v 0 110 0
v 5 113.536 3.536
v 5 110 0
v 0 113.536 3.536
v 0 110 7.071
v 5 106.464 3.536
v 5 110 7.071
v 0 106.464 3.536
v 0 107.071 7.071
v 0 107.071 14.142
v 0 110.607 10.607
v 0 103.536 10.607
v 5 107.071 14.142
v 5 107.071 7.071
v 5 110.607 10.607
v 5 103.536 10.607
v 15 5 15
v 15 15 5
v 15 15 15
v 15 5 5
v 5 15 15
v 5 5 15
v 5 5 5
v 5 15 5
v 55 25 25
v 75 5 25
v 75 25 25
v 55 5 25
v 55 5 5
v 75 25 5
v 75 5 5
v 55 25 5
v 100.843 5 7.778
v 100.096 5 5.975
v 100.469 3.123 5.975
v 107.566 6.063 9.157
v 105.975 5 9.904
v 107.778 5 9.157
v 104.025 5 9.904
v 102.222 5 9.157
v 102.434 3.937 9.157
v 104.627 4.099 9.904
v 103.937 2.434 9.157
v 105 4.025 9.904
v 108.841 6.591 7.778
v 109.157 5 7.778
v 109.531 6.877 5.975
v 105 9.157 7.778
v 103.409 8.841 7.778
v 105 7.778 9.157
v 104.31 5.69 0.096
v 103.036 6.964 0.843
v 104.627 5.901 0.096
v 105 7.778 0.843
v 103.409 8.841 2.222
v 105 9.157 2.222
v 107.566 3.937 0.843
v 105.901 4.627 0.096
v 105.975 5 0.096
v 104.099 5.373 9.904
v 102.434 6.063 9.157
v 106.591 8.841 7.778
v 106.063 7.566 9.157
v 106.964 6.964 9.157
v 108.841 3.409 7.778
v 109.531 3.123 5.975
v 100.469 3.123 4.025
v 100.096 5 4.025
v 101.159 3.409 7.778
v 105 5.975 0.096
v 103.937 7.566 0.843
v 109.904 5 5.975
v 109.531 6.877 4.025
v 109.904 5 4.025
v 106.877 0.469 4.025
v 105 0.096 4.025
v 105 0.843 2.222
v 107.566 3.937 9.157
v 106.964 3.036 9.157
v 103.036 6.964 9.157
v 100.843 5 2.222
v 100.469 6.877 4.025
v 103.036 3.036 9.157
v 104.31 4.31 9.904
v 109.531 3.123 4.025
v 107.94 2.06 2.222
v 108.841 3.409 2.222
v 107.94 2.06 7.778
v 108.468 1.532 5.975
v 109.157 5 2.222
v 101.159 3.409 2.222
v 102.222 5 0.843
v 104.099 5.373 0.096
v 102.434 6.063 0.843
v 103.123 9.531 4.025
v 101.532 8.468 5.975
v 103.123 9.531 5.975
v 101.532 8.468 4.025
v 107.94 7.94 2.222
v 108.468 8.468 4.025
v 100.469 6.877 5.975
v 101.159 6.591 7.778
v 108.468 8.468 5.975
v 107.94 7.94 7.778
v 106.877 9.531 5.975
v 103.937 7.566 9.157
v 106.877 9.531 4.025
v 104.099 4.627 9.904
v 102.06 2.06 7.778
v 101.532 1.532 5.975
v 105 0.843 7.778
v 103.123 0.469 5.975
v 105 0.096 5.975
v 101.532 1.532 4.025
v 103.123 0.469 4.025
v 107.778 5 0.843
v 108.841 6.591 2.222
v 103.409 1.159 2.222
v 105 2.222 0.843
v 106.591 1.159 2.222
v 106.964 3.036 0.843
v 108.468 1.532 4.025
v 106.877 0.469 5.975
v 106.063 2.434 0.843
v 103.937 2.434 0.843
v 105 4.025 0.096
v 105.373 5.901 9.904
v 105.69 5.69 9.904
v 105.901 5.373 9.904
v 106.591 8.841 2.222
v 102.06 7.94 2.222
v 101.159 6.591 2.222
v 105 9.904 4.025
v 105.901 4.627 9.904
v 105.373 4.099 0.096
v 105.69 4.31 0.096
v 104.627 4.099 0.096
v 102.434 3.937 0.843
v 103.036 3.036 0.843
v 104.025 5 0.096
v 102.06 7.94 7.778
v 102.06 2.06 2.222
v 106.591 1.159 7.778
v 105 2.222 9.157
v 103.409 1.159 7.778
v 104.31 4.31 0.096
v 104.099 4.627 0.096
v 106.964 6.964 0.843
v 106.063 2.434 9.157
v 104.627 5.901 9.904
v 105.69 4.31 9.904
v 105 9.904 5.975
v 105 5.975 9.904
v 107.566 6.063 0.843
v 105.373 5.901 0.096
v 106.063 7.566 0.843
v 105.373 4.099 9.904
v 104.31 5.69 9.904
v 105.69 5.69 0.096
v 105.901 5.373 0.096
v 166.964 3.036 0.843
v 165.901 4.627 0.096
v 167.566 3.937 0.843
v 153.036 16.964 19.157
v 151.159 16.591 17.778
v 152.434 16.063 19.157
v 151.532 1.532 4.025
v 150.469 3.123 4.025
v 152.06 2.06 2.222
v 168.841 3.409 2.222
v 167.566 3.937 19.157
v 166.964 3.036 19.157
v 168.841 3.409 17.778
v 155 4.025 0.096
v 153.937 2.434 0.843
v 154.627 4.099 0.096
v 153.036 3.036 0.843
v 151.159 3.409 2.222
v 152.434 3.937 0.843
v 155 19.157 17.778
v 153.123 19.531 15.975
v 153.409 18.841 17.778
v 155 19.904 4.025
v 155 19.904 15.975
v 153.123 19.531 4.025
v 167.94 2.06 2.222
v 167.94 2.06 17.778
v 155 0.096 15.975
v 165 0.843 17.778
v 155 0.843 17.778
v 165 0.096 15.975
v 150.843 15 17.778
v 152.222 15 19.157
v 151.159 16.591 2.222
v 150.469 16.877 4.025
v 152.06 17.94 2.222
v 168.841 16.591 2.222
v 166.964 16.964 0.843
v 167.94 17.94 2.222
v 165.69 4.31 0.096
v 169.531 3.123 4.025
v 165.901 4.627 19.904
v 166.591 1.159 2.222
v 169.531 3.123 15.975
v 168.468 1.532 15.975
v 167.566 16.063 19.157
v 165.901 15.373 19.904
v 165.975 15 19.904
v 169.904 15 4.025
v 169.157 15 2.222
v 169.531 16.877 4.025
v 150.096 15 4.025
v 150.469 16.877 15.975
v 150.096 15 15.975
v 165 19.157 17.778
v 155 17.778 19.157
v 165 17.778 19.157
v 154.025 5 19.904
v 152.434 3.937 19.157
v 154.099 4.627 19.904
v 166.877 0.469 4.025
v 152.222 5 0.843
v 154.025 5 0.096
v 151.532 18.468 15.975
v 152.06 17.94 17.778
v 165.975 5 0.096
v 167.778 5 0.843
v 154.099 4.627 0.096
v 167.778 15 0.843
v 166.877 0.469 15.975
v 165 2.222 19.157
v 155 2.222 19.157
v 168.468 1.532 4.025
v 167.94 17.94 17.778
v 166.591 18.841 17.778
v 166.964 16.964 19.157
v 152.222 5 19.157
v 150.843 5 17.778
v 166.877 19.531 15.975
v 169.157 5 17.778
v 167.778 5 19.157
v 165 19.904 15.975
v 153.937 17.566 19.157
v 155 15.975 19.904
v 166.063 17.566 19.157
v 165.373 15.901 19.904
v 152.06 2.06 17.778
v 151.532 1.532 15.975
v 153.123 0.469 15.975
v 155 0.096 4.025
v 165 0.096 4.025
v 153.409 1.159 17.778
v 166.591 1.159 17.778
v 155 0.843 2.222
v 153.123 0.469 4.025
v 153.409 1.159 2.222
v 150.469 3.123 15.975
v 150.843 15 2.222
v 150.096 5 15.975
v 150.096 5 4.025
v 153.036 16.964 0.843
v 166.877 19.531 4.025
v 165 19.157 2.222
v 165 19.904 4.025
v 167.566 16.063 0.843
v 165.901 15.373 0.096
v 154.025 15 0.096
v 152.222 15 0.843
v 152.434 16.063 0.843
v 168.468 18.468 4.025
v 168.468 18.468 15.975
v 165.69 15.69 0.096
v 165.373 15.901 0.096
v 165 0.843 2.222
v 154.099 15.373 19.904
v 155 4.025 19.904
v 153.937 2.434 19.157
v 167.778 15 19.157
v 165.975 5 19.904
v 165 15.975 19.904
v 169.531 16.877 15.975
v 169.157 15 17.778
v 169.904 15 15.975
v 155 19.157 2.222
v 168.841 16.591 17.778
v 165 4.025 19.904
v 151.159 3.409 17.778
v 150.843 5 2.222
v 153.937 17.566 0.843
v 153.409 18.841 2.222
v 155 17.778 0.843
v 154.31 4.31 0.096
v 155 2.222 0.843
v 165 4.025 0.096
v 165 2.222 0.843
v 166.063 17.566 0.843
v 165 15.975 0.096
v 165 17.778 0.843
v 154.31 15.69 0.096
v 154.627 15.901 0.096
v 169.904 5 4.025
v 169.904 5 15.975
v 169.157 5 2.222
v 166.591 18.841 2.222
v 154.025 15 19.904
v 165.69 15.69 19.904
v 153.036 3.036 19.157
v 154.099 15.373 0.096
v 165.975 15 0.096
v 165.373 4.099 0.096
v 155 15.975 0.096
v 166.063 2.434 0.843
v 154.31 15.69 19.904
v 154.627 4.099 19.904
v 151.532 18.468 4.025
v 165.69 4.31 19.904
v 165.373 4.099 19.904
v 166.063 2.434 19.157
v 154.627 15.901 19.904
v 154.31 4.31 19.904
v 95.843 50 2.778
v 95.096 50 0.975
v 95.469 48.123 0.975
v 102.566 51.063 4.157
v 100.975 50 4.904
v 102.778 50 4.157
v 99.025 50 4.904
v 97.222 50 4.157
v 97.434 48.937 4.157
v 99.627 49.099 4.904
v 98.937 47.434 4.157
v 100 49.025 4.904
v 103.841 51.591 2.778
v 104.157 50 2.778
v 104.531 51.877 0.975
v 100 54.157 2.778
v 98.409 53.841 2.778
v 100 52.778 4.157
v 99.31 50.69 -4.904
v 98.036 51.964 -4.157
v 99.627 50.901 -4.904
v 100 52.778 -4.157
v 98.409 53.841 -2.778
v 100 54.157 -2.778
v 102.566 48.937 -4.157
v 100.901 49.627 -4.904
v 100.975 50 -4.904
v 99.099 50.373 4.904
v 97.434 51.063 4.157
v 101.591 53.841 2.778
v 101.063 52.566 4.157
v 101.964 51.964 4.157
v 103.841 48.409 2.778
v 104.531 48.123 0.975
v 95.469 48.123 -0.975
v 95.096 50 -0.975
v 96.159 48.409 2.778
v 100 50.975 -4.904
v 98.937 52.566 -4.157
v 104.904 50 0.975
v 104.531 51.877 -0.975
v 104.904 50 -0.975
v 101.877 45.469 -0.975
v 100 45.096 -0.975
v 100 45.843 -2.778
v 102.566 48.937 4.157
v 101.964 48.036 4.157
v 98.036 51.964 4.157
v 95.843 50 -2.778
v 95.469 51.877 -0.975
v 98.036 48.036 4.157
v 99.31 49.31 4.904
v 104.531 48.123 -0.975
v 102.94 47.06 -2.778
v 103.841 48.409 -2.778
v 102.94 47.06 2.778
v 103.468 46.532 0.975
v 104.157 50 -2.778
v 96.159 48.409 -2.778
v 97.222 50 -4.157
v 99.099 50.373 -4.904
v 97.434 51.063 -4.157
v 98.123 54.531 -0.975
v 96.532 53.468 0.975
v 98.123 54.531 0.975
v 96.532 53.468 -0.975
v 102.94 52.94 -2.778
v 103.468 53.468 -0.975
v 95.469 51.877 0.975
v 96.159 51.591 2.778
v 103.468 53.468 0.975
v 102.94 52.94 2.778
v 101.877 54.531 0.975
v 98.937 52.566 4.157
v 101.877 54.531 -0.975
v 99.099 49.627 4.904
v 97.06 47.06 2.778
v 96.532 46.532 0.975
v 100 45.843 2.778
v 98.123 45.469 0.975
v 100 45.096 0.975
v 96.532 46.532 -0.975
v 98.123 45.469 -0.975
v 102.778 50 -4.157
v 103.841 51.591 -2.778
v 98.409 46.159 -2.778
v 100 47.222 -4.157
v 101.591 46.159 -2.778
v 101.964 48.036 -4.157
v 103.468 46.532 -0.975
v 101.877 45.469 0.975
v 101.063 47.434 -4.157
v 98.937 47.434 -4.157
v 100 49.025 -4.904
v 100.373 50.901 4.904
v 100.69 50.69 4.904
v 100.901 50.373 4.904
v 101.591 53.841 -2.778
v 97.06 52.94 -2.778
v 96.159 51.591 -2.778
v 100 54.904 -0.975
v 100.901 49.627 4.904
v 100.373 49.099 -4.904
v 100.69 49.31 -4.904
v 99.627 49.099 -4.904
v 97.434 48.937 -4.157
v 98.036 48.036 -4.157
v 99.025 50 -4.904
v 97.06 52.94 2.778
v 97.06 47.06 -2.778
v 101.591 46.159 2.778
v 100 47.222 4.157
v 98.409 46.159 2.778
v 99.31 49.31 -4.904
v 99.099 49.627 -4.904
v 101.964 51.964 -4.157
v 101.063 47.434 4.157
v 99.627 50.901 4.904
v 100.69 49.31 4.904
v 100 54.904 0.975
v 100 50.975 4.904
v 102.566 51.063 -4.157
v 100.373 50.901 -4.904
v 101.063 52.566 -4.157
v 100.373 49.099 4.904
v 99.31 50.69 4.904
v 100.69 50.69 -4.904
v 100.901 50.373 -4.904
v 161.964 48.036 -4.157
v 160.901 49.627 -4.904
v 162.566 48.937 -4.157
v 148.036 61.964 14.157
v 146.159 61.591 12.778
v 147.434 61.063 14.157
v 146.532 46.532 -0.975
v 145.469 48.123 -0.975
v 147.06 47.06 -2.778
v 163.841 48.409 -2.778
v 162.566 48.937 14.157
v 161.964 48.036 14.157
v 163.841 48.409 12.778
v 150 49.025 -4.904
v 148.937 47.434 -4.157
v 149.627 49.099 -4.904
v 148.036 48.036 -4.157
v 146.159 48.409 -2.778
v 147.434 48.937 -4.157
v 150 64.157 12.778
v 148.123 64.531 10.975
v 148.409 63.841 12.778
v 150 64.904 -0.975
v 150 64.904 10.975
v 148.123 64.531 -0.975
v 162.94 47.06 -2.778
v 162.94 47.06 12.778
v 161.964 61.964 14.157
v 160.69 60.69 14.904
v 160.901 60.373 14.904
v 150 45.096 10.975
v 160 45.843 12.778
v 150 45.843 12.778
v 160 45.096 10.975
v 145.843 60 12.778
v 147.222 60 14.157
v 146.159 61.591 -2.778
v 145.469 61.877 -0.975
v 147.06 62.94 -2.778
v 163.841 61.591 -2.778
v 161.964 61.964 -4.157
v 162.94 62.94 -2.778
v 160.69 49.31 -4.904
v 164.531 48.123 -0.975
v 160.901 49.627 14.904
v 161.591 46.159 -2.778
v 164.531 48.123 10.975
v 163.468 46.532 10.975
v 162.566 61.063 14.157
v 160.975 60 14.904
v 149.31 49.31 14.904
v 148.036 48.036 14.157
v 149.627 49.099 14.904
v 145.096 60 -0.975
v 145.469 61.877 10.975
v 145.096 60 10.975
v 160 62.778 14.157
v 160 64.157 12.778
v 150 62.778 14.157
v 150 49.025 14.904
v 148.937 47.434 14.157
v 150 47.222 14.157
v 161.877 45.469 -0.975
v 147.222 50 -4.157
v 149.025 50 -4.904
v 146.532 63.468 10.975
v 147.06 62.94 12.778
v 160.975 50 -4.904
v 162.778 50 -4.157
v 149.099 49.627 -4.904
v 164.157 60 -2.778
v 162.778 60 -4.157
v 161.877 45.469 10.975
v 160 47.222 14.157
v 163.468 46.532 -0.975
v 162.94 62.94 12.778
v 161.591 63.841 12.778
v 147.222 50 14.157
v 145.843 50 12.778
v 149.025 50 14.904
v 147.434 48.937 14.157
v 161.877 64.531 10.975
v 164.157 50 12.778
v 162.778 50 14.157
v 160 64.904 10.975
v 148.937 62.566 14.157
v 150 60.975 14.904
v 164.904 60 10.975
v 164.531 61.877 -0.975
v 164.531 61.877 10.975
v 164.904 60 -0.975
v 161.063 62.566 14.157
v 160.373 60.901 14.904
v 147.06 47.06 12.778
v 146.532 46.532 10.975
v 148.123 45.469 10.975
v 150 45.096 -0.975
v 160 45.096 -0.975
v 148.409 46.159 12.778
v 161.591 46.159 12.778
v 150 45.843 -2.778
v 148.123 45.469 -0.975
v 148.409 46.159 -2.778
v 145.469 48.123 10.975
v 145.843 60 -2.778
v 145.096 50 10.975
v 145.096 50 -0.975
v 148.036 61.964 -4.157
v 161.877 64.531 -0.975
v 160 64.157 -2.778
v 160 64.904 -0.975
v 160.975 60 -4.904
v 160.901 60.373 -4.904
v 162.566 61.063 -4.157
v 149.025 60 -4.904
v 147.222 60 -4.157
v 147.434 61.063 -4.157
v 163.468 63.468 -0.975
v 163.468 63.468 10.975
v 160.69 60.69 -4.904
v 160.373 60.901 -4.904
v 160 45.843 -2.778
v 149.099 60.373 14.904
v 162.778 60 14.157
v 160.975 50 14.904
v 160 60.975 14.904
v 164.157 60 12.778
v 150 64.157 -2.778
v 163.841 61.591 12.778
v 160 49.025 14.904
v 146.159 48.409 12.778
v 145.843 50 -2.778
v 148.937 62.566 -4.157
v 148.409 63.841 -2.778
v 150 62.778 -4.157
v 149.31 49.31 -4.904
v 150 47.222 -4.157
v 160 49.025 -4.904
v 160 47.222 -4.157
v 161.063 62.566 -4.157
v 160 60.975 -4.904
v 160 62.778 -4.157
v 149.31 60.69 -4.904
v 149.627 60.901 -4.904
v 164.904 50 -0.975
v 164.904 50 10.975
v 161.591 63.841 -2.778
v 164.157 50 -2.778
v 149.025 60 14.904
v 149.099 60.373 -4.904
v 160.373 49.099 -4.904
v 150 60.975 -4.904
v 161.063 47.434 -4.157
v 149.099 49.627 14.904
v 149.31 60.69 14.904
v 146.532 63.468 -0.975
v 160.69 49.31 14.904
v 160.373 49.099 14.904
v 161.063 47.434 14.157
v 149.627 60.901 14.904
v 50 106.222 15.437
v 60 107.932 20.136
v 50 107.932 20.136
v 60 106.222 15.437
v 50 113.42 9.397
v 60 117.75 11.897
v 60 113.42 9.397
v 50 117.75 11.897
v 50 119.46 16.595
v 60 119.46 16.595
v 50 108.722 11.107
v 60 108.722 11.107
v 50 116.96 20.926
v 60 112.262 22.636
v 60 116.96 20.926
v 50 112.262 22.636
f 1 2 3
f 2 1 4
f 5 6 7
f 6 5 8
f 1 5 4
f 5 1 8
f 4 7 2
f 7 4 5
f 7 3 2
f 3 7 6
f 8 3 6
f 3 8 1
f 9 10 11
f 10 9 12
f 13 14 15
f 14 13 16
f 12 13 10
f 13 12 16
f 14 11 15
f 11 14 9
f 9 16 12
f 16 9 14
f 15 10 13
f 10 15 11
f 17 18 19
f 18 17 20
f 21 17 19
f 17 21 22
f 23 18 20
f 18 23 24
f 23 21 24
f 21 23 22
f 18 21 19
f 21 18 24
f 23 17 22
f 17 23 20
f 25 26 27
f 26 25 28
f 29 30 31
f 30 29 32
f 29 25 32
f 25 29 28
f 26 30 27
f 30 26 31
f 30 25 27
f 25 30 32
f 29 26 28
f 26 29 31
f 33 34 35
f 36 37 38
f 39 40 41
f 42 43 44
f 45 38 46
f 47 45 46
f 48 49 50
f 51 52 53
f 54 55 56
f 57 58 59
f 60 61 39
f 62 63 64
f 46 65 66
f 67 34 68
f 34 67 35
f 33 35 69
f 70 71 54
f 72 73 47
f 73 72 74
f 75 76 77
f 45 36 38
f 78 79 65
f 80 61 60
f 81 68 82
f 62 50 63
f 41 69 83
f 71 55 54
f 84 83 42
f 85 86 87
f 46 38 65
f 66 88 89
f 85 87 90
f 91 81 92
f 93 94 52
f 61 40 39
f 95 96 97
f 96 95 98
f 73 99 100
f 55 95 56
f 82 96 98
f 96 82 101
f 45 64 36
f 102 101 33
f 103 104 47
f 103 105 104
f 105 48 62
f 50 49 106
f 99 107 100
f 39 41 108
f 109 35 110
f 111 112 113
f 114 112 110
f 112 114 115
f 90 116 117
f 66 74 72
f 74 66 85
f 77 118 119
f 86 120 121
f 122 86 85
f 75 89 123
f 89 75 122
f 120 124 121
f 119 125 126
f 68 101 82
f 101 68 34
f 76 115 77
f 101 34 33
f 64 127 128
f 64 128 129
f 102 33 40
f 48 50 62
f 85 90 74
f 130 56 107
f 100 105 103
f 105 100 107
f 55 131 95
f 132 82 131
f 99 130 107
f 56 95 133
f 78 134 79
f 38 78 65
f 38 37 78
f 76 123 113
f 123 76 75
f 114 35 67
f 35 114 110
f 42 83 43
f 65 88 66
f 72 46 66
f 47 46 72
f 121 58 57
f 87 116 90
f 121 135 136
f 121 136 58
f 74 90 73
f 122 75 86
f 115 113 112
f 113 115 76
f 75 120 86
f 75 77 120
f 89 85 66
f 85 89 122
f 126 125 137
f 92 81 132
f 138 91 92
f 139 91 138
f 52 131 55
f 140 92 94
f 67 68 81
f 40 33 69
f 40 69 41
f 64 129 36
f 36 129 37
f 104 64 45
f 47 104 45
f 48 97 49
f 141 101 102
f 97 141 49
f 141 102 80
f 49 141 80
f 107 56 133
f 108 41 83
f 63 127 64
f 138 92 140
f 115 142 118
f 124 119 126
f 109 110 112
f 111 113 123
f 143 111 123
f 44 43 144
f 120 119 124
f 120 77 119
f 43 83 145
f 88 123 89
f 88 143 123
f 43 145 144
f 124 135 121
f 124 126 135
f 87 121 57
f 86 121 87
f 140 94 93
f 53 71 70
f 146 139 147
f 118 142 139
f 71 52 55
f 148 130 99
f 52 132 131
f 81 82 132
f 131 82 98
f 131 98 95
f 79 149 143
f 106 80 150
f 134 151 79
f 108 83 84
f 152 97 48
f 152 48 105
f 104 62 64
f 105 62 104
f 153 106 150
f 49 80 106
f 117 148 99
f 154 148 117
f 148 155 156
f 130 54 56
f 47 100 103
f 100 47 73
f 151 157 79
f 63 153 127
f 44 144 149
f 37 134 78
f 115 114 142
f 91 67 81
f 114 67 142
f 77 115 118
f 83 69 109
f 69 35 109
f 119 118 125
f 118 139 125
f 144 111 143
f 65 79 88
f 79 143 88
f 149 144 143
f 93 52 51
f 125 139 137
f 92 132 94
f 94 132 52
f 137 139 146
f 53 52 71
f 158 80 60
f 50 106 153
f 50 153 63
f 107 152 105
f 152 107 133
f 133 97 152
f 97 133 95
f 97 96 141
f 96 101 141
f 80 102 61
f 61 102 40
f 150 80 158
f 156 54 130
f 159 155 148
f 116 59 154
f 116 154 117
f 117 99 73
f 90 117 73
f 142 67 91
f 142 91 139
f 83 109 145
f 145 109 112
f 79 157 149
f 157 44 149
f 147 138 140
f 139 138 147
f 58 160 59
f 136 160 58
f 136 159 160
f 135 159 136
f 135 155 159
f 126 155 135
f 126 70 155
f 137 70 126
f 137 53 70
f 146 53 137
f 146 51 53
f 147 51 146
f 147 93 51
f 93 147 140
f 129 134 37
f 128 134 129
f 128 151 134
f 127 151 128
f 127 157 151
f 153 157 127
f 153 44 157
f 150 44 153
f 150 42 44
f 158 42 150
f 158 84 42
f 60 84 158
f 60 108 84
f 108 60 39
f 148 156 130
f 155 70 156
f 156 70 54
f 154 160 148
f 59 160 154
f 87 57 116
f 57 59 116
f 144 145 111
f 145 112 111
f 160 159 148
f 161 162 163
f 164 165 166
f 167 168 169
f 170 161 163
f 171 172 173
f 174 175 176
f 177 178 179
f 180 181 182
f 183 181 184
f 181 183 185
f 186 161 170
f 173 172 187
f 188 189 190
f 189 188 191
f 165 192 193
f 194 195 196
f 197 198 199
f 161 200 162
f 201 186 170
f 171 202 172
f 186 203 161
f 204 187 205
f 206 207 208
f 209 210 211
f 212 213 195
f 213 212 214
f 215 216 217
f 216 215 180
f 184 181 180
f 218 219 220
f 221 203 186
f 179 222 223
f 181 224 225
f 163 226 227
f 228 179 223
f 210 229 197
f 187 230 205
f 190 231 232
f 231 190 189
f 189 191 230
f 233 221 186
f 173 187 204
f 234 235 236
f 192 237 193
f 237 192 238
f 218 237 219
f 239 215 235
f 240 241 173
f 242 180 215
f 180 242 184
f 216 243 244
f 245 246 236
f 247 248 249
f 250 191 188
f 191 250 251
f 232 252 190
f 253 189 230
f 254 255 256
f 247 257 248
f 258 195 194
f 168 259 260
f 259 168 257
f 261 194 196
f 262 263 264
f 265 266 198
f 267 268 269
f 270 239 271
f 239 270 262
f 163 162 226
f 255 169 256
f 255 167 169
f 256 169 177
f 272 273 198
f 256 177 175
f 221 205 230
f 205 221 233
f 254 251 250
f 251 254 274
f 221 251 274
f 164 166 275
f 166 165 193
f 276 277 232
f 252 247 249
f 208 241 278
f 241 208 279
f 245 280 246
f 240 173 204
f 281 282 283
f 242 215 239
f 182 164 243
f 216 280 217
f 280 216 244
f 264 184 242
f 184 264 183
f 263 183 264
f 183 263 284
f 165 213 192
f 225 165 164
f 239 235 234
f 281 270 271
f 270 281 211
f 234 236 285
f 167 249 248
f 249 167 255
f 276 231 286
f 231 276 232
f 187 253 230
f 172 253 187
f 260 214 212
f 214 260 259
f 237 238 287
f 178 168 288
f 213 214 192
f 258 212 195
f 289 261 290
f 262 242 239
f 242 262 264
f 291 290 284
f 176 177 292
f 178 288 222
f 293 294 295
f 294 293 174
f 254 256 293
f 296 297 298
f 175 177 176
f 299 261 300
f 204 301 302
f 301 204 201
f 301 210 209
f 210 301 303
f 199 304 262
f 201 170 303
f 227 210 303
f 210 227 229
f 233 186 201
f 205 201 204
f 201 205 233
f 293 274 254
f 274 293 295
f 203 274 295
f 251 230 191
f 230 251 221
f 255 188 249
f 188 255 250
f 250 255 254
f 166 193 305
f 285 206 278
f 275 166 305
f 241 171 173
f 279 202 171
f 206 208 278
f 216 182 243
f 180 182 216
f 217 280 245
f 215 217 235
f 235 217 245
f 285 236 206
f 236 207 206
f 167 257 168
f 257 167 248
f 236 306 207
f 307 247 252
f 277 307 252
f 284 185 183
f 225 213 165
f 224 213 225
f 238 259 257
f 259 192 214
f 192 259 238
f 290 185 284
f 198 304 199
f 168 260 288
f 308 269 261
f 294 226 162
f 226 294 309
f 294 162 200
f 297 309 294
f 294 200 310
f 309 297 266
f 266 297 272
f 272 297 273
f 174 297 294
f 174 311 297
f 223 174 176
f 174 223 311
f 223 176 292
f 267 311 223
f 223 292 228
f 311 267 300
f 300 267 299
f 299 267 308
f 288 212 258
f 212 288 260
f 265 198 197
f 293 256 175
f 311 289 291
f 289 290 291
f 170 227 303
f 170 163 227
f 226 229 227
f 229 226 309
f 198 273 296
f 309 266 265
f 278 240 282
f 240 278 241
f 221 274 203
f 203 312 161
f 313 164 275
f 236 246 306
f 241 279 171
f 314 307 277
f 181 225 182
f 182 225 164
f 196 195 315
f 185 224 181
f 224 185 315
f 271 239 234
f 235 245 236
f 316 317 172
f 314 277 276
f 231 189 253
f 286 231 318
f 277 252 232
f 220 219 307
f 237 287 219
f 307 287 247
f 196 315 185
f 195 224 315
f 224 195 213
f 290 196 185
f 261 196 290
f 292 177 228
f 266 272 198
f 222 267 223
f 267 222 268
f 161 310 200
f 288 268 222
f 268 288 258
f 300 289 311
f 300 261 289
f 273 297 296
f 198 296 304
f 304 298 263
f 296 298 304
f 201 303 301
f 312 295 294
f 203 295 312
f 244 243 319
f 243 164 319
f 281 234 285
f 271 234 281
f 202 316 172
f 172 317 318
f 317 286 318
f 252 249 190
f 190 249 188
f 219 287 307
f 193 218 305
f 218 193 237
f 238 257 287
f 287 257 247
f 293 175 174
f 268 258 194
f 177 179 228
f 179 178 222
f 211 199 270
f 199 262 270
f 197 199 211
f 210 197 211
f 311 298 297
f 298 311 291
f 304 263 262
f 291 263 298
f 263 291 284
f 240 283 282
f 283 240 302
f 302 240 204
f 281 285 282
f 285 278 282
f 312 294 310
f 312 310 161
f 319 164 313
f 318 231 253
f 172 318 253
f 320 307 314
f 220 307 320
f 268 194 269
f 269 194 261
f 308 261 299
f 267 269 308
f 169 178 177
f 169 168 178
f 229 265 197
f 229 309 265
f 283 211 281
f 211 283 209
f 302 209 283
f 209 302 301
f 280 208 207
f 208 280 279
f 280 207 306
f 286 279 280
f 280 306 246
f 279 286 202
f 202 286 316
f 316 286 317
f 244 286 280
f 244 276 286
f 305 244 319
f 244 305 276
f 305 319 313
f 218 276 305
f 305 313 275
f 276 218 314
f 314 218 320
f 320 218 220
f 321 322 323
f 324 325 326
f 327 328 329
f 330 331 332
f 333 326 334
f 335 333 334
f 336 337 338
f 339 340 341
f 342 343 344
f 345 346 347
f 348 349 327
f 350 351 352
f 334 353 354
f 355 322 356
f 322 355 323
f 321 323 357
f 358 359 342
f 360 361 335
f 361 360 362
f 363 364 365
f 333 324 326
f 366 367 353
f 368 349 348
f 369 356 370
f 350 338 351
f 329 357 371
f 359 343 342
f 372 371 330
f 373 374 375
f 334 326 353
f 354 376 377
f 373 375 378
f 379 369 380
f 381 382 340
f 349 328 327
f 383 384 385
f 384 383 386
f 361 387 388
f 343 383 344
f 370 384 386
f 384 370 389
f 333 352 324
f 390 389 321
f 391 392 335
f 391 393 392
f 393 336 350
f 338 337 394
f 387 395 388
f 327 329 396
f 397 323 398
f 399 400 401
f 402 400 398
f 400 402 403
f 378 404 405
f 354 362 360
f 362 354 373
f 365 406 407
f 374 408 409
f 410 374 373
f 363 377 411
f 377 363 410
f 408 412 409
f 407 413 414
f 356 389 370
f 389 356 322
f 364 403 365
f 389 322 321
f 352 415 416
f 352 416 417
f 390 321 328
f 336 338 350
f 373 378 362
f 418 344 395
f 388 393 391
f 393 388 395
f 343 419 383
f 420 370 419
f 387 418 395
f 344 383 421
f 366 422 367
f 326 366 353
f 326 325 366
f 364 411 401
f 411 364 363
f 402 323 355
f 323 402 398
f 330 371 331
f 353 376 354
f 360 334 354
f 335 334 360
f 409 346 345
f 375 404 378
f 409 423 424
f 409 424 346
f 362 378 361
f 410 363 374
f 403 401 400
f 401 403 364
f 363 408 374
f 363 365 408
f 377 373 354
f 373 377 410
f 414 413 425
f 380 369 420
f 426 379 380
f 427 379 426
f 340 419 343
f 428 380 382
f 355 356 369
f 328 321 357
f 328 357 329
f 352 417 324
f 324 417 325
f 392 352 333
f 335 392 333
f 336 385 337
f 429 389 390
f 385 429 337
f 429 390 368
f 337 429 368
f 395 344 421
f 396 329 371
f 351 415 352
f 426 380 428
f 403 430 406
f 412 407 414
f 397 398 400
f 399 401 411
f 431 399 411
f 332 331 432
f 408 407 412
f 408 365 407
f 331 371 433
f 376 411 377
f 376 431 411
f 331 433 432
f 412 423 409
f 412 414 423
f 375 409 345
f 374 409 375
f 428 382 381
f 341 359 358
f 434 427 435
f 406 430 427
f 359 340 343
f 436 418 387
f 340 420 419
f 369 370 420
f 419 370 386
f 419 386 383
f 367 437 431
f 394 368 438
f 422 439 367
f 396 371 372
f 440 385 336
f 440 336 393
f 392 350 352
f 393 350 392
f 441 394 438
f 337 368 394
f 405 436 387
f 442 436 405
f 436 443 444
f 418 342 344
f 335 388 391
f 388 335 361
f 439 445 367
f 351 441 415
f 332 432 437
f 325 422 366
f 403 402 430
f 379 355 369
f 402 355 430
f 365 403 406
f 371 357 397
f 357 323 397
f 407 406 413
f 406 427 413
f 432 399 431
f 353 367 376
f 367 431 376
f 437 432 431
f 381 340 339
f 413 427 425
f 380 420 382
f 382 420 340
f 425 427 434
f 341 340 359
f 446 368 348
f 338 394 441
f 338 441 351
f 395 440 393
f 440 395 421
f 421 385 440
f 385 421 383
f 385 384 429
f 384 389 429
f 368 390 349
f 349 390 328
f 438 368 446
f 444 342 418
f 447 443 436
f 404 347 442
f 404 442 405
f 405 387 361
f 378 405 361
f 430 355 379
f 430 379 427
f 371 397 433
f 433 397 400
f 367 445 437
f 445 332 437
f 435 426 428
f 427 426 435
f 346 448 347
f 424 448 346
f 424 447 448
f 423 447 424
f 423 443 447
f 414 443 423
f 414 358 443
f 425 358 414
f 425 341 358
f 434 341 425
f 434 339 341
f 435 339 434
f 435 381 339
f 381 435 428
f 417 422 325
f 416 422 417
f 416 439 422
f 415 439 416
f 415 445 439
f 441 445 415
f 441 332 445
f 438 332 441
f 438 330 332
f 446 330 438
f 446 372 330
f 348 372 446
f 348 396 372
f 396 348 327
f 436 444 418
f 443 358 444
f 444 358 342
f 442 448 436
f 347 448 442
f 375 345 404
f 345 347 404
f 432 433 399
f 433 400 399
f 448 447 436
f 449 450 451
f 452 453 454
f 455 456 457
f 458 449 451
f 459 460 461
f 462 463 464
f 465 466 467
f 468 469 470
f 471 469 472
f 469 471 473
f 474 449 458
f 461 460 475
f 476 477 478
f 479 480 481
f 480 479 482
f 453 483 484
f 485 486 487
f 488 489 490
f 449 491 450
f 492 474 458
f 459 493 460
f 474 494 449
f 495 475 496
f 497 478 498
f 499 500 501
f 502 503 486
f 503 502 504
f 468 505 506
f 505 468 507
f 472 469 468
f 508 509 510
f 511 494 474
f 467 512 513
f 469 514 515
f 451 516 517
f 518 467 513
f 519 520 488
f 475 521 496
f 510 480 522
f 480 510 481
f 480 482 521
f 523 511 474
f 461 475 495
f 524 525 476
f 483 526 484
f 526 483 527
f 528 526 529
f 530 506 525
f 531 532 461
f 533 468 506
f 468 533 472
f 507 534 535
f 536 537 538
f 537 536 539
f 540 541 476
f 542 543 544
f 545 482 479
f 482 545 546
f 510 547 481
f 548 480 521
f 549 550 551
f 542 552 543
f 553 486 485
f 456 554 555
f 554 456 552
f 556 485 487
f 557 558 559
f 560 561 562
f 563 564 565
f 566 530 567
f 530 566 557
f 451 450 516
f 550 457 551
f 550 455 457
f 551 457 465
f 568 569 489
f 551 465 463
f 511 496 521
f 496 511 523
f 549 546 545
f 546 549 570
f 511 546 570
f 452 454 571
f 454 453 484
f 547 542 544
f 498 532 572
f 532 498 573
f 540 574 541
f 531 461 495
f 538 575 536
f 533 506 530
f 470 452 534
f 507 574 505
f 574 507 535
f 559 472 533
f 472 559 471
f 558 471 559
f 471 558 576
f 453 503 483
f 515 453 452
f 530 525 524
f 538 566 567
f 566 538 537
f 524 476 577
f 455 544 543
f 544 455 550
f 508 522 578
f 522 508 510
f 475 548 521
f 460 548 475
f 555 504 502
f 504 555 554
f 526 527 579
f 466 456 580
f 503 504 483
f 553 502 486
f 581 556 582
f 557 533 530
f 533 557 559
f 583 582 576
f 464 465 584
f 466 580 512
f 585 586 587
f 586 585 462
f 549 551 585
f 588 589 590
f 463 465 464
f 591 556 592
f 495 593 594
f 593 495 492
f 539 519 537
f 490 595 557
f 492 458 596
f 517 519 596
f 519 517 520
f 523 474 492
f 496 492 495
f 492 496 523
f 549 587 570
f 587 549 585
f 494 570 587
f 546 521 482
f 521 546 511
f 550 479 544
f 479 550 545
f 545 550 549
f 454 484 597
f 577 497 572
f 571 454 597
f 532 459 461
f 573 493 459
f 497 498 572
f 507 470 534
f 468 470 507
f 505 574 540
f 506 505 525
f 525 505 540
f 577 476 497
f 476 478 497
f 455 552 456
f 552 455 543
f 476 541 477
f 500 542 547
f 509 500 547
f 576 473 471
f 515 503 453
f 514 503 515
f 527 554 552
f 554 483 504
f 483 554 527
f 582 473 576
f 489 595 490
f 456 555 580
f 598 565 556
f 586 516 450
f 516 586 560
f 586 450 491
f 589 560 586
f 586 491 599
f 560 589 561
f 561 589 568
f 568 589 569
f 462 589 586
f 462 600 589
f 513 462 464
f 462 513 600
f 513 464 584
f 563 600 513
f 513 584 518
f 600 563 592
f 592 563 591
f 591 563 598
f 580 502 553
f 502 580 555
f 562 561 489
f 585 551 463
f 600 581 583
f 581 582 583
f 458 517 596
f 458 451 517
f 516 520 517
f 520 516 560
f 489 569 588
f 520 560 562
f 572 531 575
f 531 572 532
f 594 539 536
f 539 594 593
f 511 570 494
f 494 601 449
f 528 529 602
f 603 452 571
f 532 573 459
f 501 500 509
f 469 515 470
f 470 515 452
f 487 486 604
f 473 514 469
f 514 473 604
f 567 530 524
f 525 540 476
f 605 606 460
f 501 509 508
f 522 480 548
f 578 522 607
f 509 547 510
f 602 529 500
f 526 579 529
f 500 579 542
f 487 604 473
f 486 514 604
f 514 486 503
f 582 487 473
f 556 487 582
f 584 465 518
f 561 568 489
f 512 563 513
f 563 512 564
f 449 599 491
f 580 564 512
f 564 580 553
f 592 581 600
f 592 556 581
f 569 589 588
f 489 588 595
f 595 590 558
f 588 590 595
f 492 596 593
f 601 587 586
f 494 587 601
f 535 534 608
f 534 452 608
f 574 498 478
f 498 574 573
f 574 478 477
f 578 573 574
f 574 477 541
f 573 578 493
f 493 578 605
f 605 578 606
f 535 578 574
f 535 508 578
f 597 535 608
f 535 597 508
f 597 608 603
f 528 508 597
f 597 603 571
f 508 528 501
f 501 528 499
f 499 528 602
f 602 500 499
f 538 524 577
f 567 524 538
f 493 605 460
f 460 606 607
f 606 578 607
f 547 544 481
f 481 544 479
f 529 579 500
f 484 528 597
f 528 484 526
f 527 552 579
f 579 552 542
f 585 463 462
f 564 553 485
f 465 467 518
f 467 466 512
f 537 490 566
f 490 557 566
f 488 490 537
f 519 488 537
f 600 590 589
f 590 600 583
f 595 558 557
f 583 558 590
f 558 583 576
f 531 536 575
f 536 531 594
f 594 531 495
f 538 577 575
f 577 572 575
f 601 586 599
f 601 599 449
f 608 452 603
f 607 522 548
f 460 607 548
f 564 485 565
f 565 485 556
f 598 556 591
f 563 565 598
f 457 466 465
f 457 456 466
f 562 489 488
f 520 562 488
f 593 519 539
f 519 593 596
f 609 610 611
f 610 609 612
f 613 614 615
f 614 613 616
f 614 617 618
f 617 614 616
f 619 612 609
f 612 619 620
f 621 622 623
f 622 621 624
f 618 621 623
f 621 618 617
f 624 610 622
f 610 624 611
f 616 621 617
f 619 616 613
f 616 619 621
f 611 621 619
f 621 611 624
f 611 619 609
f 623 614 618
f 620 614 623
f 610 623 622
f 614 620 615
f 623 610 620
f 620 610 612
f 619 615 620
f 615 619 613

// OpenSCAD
minkowski() {
    %cube([10,10,10]);
    translate([5,5,5]) cube([10,10,10]);
}


translate([50,0,0]) minkowski() {
    cube([10,10,10]);
    translate([5,5,5]) cube([10,10,10]);
}


translate([100,0,0]) minkowski() {
    %cube([10,10,10]);
    translate([5,5,5]) sphere(r=5);
}

translate([150,0,0]) minkowski() {
    cube([10,10,10]);
    translate([5,5,5]) sphere(r=5);
}

translate([100,50,0]) minkowski() {
    %cube([10,10,10]);
    sphere(r=5);
}

translate([150,50,0]) minkowski() {
    cube([10,10,10]);
    sphere(r=5);
}


translate([0,100,0]) {

color("red")   translate([0,10,0])  rotate([45,0,0])     cube(5);
color("green") rotate([45,0,0])     translate([0,10,0])  cube(5);
    
}

translate([50,100,0]) {
    minkowski() {
        color("red")   translate([0,10,0])  rotate([30,0,0])     cube(5);
        color("green") rotate([70,0,0])     translate([0,10,0])  cube(5);
    }
}
